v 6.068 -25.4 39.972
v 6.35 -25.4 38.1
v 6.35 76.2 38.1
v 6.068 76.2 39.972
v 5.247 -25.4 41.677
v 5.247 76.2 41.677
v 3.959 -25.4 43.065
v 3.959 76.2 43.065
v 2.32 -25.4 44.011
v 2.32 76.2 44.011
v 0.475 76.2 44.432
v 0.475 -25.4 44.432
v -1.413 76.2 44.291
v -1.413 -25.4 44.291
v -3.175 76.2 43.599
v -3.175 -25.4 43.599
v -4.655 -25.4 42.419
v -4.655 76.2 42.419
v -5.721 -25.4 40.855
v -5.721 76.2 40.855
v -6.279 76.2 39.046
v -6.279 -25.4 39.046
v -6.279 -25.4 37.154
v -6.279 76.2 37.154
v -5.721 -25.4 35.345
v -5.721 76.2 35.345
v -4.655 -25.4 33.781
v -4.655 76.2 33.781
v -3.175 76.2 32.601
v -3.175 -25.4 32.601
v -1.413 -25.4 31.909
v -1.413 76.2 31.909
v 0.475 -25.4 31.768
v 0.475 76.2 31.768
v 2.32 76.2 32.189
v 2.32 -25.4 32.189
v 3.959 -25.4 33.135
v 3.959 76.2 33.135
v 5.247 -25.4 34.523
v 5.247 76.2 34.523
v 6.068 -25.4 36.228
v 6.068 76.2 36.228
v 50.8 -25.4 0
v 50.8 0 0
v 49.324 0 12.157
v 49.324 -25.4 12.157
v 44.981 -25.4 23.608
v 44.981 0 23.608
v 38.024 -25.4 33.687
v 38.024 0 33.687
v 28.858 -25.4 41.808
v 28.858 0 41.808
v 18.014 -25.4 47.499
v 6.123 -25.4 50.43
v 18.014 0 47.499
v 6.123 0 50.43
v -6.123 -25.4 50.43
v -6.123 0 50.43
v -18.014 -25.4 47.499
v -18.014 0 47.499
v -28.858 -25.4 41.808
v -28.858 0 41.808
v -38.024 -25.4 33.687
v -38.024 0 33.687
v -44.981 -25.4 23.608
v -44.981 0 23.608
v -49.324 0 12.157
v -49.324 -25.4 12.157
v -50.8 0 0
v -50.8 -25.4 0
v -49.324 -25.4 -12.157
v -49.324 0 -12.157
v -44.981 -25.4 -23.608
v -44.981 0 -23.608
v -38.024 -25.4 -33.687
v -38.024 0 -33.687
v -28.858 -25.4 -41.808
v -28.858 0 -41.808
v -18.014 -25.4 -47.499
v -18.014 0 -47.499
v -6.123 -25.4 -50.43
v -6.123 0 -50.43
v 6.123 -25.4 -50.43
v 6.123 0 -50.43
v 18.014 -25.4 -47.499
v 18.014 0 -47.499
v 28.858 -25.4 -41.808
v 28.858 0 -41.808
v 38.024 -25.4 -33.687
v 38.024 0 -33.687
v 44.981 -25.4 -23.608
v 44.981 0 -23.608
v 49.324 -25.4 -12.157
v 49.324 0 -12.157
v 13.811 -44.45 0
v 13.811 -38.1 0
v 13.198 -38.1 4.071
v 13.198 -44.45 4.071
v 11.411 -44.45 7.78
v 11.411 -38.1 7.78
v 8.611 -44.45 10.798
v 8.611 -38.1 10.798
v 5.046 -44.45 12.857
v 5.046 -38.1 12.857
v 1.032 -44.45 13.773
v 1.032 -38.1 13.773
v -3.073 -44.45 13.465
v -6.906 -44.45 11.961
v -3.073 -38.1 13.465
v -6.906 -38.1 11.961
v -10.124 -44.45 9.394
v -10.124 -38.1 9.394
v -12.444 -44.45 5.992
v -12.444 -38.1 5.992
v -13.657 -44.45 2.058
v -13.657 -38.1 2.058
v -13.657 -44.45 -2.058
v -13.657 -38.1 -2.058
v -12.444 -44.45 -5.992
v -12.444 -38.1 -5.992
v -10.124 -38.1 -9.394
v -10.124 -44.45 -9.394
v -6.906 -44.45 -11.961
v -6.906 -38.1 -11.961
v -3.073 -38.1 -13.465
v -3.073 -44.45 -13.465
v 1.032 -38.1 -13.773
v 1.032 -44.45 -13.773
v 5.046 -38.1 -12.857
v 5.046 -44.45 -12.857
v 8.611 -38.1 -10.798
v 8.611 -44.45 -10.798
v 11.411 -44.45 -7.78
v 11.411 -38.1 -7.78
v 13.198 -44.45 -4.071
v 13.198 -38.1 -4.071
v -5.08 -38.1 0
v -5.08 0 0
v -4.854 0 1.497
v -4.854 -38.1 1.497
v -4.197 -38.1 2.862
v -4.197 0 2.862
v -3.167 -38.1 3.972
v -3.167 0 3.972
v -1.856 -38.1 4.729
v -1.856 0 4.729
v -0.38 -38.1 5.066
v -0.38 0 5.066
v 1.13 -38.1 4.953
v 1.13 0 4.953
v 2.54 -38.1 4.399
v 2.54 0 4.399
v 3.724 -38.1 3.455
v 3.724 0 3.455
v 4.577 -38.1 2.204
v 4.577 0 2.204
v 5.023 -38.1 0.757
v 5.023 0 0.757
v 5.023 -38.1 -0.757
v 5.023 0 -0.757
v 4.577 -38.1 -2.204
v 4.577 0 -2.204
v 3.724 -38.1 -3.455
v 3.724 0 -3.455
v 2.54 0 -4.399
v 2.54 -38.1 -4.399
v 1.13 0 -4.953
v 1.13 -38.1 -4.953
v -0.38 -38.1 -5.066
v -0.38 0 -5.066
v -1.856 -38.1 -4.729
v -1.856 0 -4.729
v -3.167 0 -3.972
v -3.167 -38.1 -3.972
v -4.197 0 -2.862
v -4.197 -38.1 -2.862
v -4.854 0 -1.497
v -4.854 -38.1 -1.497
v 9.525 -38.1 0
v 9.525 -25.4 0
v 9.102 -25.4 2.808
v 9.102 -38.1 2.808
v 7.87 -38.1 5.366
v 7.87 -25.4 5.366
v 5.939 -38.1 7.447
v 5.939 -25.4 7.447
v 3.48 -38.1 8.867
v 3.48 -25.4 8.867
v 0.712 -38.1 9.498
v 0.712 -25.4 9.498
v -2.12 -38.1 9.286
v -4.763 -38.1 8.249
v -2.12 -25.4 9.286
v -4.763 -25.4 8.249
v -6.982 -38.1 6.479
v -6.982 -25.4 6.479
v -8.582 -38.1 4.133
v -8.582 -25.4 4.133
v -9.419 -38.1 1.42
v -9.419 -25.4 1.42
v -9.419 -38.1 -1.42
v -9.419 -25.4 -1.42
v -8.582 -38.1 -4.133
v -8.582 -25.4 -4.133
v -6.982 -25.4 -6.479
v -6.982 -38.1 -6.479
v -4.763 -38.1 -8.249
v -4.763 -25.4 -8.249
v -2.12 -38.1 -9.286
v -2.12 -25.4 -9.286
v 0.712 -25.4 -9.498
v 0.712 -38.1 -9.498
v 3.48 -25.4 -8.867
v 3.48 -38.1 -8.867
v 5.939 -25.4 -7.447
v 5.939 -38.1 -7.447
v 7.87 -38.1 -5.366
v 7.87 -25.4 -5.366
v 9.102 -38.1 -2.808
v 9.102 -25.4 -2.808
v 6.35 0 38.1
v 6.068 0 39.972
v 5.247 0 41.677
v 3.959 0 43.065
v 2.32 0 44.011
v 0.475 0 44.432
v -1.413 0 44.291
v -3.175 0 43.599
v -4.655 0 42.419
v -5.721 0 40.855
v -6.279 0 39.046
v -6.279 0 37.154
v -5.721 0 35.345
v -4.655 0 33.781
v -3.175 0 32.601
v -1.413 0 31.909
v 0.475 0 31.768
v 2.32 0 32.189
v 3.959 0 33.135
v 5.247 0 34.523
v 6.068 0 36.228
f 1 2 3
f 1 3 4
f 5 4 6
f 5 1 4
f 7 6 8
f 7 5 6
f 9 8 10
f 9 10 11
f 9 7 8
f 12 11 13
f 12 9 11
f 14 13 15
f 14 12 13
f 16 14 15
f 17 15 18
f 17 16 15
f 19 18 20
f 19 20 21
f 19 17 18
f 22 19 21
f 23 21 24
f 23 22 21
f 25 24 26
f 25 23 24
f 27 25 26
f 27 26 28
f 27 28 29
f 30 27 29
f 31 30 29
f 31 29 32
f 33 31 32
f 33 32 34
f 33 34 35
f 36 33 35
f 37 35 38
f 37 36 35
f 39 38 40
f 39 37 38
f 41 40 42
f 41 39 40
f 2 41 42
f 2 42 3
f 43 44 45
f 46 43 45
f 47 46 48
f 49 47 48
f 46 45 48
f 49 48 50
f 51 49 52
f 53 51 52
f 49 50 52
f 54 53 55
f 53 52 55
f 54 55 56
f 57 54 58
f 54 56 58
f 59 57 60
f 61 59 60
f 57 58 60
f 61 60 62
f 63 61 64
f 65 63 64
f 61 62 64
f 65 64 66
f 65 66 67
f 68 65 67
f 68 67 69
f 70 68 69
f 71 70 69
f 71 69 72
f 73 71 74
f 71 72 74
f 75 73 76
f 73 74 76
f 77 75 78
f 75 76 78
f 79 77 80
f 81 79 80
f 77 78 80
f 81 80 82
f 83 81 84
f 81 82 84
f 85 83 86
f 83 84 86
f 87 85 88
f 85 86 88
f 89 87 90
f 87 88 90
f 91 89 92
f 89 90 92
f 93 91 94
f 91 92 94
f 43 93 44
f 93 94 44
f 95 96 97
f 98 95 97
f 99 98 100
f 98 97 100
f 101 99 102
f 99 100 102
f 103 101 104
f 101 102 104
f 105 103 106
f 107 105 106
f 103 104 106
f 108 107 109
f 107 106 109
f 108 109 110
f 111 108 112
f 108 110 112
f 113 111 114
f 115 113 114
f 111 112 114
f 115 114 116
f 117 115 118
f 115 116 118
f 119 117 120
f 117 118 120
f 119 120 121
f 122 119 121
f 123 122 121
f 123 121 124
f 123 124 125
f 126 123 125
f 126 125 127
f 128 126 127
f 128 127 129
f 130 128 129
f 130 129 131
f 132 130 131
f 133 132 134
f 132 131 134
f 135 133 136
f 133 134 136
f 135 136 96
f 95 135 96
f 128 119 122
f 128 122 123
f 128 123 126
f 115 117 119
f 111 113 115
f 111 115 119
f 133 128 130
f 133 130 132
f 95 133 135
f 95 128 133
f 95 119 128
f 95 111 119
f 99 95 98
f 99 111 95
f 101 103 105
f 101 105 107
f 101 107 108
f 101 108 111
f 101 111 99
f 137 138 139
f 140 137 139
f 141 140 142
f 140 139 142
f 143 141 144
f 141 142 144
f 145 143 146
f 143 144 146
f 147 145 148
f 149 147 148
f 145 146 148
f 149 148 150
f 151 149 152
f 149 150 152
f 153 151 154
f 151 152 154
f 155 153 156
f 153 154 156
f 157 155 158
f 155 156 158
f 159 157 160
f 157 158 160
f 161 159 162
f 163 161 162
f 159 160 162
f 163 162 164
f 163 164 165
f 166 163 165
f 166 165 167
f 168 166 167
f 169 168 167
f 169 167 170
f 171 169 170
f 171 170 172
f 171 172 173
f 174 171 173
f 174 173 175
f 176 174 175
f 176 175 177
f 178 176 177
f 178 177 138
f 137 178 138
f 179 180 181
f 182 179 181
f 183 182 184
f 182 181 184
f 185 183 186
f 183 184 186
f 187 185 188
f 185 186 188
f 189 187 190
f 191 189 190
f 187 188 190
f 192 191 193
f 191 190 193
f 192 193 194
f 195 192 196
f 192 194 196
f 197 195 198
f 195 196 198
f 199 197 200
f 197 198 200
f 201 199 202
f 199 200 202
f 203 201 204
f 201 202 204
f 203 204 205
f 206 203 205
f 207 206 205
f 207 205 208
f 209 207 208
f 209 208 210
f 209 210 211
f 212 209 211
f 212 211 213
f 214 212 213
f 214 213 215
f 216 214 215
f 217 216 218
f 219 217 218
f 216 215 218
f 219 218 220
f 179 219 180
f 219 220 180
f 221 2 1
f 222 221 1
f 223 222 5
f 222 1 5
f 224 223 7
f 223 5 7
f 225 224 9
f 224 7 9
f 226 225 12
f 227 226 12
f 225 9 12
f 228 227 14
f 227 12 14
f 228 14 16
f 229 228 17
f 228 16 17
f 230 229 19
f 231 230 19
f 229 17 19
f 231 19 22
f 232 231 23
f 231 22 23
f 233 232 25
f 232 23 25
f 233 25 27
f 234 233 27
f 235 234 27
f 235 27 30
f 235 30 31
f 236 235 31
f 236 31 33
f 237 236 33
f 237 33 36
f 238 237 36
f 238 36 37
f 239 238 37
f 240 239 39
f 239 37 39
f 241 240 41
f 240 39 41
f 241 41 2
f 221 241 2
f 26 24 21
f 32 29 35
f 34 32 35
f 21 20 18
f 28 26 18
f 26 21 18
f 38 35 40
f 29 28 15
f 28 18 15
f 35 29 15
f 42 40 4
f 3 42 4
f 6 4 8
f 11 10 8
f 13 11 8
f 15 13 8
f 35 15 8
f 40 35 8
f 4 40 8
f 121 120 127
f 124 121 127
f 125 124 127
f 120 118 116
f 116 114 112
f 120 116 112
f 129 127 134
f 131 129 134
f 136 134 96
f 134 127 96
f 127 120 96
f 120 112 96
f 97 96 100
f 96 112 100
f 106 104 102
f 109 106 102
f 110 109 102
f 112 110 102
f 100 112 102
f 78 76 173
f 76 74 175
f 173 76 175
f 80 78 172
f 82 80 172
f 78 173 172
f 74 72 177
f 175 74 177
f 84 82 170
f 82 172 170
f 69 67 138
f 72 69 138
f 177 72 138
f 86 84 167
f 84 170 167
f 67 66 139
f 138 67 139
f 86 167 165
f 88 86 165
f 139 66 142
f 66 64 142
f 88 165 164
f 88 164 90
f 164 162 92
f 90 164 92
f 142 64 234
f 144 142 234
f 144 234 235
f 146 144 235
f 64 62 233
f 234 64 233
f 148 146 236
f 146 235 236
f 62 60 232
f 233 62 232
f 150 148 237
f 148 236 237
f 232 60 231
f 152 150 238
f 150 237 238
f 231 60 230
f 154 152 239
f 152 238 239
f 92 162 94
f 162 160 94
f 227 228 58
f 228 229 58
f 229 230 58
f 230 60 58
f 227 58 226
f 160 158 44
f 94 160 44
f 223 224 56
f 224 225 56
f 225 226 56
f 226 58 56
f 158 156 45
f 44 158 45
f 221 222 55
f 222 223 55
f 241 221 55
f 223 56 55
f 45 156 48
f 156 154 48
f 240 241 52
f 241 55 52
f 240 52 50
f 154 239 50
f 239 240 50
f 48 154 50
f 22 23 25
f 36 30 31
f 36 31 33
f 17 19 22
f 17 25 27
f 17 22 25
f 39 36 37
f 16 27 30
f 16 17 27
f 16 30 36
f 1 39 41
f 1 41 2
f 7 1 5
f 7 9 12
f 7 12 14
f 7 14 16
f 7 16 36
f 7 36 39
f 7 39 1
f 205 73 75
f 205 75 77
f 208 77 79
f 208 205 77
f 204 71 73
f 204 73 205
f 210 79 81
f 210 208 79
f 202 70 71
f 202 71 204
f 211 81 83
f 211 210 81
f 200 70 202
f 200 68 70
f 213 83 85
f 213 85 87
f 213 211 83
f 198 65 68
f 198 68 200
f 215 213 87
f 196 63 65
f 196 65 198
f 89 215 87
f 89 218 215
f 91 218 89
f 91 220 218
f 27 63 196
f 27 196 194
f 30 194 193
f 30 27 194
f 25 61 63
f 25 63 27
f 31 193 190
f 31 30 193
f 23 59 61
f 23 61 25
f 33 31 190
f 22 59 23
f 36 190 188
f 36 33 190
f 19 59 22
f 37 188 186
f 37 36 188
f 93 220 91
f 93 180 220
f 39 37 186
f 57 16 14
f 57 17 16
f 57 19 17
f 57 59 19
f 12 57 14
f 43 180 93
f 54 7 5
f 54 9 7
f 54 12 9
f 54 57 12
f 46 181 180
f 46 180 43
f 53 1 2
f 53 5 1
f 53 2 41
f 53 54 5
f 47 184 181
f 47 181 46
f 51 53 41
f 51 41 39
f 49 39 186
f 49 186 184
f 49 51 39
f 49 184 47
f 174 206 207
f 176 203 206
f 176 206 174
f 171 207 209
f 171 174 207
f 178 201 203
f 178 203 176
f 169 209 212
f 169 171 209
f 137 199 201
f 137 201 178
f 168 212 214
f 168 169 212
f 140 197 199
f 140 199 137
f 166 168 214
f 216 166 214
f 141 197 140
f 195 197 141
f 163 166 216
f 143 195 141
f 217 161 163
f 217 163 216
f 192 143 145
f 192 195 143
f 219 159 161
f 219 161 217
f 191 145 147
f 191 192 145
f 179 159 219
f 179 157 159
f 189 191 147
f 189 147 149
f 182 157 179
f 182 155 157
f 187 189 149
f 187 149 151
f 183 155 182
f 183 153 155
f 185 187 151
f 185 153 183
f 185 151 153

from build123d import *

# Parameters (mm, degrees)
F0_R      = 50.8
F1_DEPTH  = 25.4
F2_R      = 9.525
F3_DEPTH  = 12.7
F4_R      = 5.08
F5_DEPTH  = 50.8
F6_R      = 6.35
F7_DEPTH  = 25.4
F8_DEPTH  = 101.6
F9_R      = 13.81125
F10_DEPTH = 6.35


with BuildPart() as f1:
    # F0 (on Front) → F1 (new body)
    with BuildSketch(Plane.XZ):
        Circle(F0_R)
    extrude(amount=F1_DEPTH)

    # F2 (on face) → F3 (join)
    with BuildSketch(Plane.XZ.offset(25.4)):
        Circle(F2_R)
    extrude(amount=F3_DEPTH)

    # F4 (on face) → F5 (cut)
    with BuildSketch(Plane(origin=(0, 0, 0), x_dir=(-1, 0, 0), z_dir=(0, 1, 0))):
        Circle(F4_R)
    extrude(amount=-F5_DEPTH, mode=Mode.SUBTRACT)

    # F6 (on face) → F7 (cut)
    with BuildSketch(Plane.XZ.offset(25.4)):
        with Locations((0, 38.1)):
            Circle(F6_R)
    extrude(amount=-F7_DEPTH, mode=Mode.SUBTRACT)


with BuildPart() as f8:
    # F6 (on face) → F8 (new body)
    with BuildSketch(Plane.XZ.offset(25.4)):
        with Locations((0, 38.1)):
            Circle(F6_R)
    extrude(amount=-F8_DEPTH)


with BuildPart() as f10:
    # F9 (on face) → F10 (new body)
    with BuildSketch(Plane.XZ.offset(38.1)):
        Circle(F9_R)
    extrude(amount=F10_DEPTH)


solid = Compound([f1.part, f8.part, f10.part])
